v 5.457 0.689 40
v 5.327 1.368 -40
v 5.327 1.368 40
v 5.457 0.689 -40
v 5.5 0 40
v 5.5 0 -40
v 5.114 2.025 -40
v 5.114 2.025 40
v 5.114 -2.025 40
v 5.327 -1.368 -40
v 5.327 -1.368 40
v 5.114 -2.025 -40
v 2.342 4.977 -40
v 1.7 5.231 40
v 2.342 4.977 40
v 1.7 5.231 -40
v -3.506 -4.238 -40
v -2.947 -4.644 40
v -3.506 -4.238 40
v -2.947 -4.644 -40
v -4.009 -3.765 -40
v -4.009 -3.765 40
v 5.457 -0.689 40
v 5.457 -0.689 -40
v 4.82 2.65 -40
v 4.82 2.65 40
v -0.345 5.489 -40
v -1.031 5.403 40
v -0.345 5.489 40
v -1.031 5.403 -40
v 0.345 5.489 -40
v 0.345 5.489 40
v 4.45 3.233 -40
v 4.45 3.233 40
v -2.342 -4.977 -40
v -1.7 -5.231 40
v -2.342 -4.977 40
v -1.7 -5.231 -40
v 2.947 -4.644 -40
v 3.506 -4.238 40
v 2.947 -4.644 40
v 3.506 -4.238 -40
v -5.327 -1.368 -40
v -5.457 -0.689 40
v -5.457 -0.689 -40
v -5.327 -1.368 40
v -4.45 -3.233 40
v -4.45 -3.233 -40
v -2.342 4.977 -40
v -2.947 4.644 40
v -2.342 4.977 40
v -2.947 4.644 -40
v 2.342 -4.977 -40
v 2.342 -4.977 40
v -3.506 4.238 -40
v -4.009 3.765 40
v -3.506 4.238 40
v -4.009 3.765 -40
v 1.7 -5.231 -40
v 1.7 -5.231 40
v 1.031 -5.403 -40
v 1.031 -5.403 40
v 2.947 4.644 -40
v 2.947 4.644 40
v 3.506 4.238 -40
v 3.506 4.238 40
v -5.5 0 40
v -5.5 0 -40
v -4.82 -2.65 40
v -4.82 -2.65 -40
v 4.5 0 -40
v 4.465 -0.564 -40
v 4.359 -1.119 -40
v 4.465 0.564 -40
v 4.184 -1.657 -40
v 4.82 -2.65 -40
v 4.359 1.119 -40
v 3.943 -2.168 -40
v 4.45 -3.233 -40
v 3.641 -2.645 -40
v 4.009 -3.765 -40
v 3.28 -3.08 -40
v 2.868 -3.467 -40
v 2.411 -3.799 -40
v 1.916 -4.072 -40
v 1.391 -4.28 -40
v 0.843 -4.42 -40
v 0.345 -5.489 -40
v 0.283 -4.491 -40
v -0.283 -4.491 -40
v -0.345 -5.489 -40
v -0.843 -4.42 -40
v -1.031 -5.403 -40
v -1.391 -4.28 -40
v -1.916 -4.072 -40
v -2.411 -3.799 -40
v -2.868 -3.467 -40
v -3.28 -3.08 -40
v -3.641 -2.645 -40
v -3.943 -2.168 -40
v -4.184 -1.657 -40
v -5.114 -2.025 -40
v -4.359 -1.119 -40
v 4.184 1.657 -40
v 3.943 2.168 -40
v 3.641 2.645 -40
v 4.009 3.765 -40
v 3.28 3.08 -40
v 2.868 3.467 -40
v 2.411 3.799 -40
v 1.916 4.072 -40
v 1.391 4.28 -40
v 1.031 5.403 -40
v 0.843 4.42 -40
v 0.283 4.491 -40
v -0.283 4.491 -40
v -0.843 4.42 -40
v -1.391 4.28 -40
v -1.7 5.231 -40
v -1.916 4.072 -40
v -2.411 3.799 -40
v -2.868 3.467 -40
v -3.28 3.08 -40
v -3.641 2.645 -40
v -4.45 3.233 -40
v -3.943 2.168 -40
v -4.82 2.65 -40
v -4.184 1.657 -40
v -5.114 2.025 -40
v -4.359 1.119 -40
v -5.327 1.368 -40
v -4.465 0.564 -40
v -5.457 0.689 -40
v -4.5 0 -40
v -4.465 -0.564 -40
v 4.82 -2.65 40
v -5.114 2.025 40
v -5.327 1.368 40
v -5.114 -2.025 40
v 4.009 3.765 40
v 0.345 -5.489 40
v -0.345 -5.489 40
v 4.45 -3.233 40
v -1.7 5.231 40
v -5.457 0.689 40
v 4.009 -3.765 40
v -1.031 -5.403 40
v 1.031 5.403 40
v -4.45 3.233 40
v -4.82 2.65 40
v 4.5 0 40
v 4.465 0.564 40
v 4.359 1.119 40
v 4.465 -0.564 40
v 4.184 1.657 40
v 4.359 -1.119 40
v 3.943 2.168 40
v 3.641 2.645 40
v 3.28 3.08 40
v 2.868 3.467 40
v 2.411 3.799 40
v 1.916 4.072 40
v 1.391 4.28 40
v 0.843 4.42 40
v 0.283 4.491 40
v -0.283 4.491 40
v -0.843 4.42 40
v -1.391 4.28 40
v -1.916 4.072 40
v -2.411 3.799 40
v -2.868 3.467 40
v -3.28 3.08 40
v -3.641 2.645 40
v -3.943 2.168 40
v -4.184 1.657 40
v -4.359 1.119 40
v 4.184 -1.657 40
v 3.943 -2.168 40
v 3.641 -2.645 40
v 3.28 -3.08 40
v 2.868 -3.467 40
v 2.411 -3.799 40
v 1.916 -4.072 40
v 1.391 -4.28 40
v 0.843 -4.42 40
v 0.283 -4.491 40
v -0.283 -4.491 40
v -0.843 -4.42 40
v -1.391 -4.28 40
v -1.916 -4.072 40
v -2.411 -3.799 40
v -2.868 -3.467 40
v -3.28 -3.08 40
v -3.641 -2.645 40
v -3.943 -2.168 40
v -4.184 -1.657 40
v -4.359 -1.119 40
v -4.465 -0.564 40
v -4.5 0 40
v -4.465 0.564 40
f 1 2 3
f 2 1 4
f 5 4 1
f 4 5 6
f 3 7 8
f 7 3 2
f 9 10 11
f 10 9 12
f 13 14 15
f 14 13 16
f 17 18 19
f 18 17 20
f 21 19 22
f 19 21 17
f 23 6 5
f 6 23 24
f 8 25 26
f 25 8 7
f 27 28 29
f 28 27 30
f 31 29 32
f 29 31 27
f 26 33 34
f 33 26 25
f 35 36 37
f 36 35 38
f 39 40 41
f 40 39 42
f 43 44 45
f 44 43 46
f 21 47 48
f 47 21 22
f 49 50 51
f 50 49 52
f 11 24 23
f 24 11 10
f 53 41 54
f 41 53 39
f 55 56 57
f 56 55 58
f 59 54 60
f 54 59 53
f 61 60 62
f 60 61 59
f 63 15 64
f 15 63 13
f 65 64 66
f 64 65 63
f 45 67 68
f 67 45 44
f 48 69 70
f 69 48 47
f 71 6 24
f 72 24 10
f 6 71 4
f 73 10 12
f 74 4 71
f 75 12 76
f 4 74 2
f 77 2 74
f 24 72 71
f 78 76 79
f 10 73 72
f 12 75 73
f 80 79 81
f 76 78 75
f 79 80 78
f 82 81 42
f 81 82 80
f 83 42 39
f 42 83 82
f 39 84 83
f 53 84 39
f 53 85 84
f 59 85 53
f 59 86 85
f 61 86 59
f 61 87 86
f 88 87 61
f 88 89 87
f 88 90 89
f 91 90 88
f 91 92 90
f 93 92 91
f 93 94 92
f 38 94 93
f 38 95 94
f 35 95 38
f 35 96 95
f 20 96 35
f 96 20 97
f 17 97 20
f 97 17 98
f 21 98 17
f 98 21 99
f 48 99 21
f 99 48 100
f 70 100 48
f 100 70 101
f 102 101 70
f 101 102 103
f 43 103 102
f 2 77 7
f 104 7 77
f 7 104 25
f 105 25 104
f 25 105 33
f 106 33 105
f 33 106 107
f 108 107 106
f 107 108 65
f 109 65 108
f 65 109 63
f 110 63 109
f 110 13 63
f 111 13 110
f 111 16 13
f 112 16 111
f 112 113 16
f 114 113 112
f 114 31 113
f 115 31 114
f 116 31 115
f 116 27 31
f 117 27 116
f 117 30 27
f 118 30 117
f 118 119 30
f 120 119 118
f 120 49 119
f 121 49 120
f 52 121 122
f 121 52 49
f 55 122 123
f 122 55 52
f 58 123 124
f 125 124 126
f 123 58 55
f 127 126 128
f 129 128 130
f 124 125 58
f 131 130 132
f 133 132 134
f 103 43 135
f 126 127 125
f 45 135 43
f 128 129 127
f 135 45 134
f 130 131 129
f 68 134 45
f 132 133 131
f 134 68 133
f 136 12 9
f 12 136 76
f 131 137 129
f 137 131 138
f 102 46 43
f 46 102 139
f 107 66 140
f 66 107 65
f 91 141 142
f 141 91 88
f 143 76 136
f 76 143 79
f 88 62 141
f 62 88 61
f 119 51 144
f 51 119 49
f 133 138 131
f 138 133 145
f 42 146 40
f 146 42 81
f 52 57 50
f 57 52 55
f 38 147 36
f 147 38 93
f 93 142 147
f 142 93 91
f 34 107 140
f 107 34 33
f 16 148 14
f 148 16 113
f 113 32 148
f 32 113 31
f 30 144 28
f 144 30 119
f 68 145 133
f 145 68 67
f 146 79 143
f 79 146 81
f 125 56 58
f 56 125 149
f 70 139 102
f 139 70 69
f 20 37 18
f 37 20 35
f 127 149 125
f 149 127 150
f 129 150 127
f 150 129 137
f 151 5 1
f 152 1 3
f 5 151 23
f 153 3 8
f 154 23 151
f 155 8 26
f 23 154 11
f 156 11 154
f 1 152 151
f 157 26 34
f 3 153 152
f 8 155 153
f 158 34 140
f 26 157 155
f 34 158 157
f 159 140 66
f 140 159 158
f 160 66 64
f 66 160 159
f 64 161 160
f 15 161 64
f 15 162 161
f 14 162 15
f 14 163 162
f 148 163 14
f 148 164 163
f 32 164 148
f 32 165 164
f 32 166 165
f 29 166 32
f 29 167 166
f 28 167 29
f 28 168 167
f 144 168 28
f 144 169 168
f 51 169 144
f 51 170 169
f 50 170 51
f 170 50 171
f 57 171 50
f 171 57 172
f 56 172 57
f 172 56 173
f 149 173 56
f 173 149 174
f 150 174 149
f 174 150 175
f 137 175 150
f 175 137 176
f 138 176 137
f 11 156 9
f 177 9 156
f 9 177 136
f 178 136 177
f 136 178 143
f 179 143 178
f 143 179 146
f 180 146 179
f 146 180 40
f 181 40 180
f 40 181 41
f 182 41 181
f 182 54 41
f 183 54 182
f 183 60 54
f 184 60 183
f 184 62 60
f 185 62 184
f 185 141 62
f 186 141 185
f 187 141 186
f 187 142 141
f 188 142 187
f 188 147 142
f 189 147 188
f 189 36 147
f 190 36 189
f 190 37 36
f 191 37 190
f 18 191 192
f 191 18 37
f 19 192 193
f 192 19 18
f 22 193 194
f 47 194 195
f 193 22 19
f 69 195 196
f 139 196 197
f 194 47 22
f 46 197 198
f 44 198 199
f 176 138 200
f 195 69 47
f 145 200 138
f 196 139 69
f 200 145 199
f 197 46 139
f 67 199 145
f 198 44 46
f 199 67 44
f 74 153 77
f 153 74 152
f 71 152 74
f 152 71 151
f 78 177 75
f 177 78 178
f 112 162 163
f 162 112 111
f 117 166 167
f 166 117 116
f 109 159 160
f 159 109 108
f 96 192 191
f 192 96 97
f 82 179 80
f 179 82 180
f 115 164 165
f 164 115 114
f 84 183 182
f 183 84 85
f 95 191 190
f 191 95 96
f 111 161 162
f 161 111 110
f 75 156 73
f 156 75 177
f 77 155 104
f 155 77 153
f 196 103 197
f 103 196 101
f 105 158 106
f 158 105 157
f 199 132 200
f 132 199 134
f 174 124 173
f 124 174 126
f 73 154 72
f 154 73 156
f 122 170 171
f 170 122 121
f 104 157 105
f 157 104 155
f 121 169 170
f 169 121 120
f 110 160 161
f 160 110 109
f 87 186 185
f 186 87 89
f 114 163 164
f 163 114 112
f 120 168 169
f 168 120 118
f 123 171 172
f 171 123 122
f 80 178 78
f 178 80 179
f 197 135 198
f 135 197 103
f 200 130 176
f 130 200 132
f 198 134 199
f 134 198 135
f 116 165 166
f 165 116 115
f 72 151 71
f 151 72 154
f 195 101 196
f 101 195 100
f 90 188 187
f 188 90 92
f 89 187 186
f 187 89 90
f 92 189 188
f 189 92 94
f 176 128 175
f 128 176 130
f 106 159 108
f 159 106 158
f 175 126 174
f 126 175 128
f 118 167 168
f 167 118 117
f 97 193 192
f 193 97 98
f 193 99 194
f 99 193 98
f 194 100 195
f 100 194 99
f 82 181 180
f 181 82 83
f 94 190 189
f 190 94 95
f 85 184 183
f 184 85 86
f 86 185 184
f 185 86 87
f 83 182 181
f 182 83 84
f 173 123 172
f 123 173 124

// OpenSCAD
$fn = 50;


difference() {
	union() {
		translate(v = [0, 0, -40.0000000000]) {
			cylinder(h = 80, r = 5.5000000000);
		}
	}
	union() {
		translate(v = [0, 0, -100.0000000000]) {
			cylinder(h = 200, r = 4.5000000000);
		}
	}
}
